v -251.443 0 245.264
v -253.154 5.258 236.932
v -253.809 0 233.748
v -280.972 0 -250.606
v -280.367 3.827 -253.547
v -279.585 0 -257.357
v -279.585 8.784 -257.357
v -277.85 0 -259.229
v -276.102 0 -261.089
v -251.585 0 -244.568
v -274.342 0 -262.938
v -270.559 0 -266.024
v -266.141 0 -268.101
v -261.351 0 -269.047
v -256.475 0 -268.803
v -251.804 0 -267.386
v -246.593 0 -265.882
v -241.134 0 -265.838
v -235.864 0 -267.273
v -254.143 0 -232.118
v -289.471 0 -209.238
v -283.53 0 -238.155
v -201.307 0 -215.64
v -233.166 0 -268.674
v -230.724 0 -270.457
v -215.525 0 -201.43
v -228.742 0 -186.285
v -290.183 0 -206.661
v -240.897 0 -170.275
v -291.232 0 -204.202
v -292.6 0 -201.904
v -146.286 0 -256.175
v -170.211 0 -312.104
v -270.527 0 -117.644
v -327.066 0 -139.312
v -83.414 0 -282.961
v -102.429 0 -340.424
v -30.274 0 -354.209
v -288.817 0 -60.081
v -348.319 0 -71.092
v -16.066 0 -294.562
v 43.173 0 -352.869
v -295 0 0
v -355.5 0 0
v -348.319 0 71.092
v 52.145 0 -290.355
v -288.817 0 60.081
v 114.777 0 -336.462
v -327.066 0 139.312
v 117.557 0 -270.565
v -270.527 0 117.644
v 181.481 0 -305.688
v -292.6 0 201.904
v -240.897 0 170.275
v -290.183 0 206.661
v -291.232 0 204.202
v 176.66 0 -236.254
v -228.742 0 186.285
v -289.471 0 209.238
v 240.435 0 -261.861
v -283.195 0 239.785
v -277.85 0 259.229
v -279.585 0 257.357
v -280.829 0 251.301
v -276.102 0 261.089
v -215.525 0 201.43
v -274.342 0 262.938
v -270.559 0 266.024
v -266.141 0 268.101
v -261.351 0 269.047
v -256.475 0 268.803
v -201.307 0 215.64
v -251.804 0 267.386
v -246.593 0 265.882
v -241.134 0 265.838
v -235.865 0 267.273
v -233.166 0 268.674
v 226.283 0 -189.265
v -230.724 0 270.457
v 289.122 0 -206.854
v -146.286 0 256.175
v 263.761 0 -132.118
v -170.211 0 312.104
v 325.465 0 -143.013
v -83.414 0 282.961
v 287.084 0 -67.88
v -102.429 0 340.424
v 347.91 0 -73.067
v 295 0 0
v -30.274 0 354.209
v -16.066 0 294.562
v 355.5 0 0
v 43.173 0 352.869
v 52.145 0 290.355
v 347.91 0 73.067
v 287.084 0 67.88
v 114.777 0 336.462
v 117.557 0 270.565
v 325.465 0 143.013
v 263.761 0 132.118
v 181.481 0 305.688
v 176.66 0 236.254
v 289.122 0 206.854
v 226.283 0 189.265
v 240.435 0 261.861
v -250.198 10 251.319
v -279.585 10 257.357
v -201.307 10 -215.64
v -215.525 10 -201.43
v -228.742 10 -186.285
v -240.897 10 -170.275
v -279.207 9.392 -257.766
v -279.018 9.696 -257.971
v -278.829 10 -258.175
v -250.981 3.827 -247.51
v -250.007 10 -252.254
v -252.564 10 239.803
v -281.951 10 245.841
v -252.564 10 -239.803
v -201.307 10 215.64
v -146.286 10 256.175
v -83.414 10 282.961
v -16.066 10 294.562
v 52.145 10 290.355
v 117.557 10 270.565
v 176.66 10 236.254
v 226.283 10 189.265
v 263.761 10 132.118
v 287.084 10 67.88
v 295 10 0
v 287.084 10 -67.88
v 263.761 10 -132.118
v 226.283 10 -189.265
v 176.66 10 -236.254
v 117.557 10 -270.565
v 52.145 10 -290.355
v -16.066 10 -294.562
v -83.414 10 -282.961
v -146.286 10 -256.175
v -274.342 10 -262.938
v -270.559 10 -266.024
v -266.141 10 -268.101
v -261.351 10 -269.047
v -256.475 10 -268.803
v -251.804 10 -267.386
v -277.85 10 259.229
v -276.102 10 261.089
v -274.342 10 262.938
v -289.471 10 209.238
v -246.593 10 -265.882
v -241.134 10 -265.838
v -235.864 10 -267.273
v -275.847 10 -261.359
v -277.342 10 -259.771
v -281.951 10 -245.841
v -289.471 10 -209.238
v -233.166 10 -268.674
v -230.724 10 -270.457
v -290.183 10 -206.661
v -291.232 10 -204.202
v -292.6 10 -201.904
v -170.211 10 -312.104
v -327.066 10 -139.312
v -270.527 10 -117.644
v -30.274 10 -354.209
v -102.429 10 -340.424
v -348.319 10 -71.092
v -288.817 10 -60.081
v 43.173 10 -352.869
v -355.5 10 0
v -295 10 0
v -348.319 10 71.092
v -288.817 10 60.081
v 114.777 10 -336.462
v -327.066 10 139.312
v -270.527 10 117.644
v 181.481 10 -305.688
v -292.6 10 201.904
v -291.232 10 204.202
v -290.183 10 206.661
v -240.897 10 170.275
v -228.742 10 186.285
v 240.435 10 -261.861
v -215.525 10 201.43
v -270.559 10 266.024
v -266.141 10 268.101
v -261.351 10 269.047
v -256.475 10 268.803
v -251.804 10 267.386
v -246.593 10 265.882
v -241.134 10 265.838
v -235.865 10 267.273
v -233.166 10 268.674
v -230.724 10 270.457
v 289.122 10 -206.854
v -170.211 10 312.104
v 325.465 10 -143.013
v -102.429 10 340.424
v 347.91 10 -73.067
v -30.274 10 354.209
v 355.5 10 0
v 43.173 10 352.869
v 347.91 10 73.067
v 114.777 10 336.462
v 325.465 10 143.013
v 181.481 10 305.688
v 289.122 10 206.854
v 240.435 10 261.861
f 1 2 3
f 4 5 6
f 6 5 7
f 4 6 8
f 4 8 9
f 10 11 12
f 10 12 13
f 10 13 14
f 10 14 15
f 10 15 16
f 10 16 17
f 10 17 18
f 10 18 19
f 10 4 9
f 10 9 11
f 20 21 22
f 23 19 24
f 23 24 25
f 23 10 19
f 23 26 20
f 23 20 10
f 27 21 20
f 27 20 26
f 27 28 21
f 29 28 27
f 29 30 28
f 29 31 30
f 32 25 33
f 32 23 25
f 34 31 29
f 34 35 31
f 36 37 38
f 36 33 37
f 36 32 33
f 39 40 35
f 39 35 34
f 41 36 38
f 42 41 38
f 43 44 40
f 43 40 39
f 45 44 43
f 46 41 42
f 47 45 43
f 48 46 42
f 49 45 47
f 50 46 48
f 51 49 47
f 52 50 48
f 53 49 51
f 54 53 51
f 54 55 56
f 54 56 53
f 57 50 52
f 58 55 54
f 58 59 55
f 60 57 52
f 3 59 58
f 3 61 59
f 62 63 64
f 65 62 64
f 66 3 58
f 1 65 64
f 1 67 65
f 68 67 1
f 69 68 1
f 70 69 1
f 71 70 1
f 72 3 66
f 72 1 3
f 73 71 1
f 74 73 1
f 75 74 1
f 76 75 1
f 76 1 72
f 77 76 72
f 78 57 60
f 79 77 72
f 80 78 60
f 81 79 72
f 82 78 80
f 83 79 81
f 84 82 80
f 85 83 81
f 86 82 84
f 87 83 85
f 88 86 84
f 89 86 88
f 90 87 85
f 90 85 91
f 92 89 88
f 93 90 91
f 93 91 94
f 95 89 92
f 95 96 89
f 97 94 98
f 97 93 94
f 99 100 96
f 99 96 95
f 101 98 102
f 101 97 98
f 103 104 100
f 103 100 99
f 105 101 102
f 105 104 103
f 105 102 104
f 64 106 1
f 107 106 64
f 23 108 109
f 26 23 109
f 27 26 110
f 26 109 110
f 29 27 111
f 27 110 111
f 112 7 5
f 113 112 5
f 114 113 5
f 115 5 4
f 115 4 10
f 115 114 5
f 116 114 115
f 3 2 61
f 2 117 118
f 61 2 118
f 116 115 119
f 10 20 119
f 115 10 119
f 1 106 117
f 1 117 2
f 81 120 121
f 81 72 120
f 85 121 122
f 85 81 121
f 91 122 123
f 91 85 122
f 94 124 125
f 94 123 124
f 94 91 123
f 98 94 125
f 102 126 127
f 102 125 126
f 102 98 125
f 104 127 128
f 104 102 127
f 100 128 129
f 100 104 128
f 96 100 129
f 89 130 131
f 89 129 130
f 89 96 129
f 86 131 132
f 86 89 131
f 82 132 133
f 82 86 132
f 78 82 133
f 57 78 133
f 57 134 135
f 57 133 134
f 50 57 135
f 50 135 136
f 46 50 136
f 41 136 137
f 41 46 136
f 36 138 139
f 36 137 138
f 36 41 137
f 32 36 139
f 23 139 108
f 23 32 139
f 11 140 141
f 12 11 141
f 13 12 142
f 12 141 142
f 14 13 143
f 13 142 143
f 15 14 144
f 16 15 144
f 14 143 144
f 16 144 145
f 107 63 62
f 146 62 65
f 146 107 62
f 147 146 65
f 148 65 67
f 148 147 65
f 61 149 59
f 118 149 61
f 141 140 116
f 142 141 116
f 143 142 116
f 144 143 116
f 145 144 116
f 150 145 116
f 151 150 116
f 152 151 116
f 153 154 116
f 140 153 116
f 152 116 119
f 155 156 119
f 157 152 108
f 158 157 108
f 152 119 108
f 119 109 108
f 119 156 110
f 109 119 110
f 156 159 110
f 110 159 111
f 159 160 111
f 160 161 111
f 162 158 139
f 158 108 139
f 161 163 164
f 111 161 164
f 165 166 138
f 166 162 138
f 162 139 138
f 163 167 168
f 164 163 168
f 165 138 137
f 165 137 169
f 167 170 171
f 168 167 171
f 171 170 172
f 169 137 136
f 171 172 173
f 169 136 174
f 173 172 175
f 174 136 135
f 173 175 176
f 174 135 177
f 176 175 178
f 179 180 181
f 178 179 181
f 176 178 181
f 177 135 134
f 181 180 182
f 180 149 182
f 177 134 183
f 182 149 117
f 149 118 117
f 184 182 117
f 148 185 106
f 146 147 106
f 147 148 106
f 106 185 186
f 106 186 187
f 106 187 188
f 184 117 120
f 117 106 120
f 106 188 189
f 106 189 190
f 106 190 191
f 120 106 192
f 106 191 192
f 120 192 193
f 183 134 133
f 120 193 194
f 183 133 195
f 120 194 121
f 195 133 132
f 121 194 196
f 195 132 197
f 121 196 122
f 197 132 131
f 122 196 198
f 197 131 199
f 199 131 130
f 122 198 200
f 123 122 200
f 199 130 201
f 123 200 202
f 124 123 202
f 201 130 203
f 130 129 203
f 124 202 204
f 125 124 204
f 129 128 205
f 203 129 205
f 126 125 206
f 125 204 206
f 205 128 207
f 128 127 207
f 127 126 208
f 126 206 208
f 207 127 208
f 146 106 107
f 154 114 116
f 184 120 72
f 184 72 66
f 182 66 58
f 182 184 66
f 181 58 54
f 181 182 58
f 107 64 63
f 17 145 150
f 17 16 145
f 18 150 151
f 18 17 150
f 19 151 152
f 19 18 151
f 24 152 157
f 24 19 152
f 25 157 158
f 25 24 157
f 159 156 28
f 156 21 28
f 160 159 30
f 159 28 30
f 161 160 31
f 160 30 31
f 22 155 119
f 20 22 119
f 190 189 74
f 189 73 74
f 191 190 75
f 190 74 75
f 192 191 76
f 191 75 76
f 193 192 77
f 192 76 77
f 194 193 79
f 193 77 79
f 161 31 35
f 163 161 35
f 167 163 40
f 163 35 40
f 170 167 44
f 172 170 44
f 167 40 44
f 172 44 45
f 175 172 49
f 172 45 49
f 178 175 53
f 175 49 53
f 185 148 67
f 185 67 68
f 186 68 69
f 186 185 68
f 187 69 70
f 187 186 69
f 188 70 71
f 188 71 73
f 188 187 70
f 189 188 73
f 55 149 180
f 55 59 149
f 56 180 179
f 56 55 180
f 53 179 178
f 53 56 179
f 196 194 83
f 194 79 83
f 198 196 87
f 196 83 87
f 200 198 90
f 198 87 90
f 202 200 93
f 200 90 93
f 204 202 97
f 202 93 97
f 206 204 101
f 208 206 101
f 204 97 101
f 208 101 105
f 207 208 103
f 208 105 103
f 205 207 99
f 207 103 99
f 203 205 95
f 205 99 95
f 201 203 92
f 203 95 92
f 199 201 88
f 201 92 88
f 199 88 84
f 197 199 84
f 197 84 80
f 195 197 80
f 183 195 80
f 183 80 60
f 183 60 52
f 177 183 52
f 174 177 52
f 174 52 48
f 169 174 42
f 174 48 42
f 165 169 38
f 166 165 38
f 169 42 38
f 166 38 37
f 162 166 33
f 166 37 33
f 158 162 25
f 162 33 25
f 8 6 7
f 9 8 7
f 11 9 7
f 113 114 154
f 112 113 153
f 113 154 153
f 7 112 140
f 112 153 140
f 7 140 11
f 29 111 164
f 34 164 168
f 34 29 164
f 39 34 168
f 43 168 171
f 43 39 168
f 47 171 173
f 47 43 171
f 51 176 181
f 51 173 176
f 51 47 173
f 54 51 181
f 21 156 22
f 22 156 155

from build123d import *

# Parameters (mm, degrees)
SKETCH1_R            = 355.5
SKETCH1_R_2          = 295
BOSS_EXTRUDE1_DEPTH  = 10
BOSS_EXTRUDE2_DEPTH  = 10
FILLET1_R            = 20
CUT_EXTRUDE2_DEPTH   = 10
FILLET1_OF_MIRROR1_R = 20
CUT_EXTRUDE3_DEPTH   = 10


with BuildPart() as part:
    # Sketch1 → Boss-Extrude1 (new body)
    with BuildSketch(Plane(origin=(0, 0, 0), x_dir=(1, 0, 0), z_dir=(0, 1, 0))):
        with Locations(Location((0, 0, 0), (0, 0, 270))):
            Circle(SKETCH1_R)
        with Locations(Location((0, 0, 0), (0, 0, 270))):
            Circle(SKETCH1_R_2, mode=Mode.SUBTRACT)
    extrude(amount=BOSS_EXTRUDE1_DEPTH)

    # Sketch2 → Boss-Extrude2 (add)
    with BuildSketch(Plane(origin=(0, 10, 0), x_dir=(1, 0, 0), z_dir=(0, 1, 0))):
        with BuildLine():
            Line((-245.283583567, -262.746957418), (-201.307169156, -215.639568833))
            ThreePointArc((-201.307169156, -215.639568833), (-222.262433031, -193.970128791), (-240.896902392, -170.27531359))
            Line((-240.896902392, -170.27531359), (-290.301182374, -205.196182987))
            Line((-290.301182374, -205.196182987), (-281.950699468, -245.840512698))
            Line((-281.950699468, -245.840512698), (-279.584698805, -257.356554597))
            ThreePointArc((-279.584698805, -257.356554597), (-276.977549571, -260.160406353), (-274.342282872, -262.937847843))
            ThreePointArc((-274.342282872, -262.937847843), (-259.771835552, -269.098582225), (-245.283583567, -262.746957418))
        make_face()
    boss_extrude2 = extrude(amount=-BOSS_EXTRUDE2_DEPTH)

    # Fillet1
    fillet1_edges = [part.edges().sort_by_distance(p)[0] for p in [
        (-242.592198763, 5, 259.863954983),
        (-290.301182374, 5, 205.196182987),
    ]]
    fillet(fillet1_edges, radius=FILLET1_R)

    # Sketch5 → Cut-Extrude2 (cut)
    with BuildSketch(Plane(origin=(27.612671151, -84.821098534, 134.399234523), x_dir=(0.9852397845422893, 0.0913606537099085, -0.14476117541924585), z_dir=(0.17117992567781853, -0.5258335661753164, 0.8331845496216823))):
        Polygon((-283.235912451, 130.899924333), (-284.869220227, 115.781445421), (-336.691704543, 117.064133397), (-330.542349464, 147.835610422), (-311.799599221, 145.810758591), (-281.973151258, 142.588492009), align=None)
    extrude(amount=-CUT_EXTRUDE2_DEPTH, mode=Mode.SUBTRACT)

    # Mirror1: Boss-Extrude2 across plane
    add(boss_extrude2.mirror(Plane.XY))

    # Fillet1 of Mirror1
    fillet1_of_mirror1_edges = [part.edges().sort_by_distance(p)[0] for p in [
        (-242.592198763, 5, -259.863954983),
        (-290.301182374, 5, -205.196182987),
    ]]
    fillet(fillet1_of_mirror1_edges, radius=FILLET1_OF_MIRROR1_R)

    # Sketch7 → Cut-Extrude3 (cut)
    with BuildSketch(Plane(origin=(21.951425264, -85.580716552, -106.844235968), x_dir=(0.9873859847265816, 0.0989832733999036, 0.12357681316719149), z_dir=(-0.1583316682332344, 0.6172782613106412, 0.7706481888305408))):
        Polygon((-278.02290676, 157.72118356), (-276.013481271, 173.565711271), (-305.775097923, 177.340121727), (-307.784523411, 161.495594016), (-310.409727388, 140.795589263), (-280.648110736, 137.021178806), align=None)
    extrude(amount=-CUT_EXTRUDE3_DEPTH, mode=Mode.SUBTRACT)


solid = part.part
